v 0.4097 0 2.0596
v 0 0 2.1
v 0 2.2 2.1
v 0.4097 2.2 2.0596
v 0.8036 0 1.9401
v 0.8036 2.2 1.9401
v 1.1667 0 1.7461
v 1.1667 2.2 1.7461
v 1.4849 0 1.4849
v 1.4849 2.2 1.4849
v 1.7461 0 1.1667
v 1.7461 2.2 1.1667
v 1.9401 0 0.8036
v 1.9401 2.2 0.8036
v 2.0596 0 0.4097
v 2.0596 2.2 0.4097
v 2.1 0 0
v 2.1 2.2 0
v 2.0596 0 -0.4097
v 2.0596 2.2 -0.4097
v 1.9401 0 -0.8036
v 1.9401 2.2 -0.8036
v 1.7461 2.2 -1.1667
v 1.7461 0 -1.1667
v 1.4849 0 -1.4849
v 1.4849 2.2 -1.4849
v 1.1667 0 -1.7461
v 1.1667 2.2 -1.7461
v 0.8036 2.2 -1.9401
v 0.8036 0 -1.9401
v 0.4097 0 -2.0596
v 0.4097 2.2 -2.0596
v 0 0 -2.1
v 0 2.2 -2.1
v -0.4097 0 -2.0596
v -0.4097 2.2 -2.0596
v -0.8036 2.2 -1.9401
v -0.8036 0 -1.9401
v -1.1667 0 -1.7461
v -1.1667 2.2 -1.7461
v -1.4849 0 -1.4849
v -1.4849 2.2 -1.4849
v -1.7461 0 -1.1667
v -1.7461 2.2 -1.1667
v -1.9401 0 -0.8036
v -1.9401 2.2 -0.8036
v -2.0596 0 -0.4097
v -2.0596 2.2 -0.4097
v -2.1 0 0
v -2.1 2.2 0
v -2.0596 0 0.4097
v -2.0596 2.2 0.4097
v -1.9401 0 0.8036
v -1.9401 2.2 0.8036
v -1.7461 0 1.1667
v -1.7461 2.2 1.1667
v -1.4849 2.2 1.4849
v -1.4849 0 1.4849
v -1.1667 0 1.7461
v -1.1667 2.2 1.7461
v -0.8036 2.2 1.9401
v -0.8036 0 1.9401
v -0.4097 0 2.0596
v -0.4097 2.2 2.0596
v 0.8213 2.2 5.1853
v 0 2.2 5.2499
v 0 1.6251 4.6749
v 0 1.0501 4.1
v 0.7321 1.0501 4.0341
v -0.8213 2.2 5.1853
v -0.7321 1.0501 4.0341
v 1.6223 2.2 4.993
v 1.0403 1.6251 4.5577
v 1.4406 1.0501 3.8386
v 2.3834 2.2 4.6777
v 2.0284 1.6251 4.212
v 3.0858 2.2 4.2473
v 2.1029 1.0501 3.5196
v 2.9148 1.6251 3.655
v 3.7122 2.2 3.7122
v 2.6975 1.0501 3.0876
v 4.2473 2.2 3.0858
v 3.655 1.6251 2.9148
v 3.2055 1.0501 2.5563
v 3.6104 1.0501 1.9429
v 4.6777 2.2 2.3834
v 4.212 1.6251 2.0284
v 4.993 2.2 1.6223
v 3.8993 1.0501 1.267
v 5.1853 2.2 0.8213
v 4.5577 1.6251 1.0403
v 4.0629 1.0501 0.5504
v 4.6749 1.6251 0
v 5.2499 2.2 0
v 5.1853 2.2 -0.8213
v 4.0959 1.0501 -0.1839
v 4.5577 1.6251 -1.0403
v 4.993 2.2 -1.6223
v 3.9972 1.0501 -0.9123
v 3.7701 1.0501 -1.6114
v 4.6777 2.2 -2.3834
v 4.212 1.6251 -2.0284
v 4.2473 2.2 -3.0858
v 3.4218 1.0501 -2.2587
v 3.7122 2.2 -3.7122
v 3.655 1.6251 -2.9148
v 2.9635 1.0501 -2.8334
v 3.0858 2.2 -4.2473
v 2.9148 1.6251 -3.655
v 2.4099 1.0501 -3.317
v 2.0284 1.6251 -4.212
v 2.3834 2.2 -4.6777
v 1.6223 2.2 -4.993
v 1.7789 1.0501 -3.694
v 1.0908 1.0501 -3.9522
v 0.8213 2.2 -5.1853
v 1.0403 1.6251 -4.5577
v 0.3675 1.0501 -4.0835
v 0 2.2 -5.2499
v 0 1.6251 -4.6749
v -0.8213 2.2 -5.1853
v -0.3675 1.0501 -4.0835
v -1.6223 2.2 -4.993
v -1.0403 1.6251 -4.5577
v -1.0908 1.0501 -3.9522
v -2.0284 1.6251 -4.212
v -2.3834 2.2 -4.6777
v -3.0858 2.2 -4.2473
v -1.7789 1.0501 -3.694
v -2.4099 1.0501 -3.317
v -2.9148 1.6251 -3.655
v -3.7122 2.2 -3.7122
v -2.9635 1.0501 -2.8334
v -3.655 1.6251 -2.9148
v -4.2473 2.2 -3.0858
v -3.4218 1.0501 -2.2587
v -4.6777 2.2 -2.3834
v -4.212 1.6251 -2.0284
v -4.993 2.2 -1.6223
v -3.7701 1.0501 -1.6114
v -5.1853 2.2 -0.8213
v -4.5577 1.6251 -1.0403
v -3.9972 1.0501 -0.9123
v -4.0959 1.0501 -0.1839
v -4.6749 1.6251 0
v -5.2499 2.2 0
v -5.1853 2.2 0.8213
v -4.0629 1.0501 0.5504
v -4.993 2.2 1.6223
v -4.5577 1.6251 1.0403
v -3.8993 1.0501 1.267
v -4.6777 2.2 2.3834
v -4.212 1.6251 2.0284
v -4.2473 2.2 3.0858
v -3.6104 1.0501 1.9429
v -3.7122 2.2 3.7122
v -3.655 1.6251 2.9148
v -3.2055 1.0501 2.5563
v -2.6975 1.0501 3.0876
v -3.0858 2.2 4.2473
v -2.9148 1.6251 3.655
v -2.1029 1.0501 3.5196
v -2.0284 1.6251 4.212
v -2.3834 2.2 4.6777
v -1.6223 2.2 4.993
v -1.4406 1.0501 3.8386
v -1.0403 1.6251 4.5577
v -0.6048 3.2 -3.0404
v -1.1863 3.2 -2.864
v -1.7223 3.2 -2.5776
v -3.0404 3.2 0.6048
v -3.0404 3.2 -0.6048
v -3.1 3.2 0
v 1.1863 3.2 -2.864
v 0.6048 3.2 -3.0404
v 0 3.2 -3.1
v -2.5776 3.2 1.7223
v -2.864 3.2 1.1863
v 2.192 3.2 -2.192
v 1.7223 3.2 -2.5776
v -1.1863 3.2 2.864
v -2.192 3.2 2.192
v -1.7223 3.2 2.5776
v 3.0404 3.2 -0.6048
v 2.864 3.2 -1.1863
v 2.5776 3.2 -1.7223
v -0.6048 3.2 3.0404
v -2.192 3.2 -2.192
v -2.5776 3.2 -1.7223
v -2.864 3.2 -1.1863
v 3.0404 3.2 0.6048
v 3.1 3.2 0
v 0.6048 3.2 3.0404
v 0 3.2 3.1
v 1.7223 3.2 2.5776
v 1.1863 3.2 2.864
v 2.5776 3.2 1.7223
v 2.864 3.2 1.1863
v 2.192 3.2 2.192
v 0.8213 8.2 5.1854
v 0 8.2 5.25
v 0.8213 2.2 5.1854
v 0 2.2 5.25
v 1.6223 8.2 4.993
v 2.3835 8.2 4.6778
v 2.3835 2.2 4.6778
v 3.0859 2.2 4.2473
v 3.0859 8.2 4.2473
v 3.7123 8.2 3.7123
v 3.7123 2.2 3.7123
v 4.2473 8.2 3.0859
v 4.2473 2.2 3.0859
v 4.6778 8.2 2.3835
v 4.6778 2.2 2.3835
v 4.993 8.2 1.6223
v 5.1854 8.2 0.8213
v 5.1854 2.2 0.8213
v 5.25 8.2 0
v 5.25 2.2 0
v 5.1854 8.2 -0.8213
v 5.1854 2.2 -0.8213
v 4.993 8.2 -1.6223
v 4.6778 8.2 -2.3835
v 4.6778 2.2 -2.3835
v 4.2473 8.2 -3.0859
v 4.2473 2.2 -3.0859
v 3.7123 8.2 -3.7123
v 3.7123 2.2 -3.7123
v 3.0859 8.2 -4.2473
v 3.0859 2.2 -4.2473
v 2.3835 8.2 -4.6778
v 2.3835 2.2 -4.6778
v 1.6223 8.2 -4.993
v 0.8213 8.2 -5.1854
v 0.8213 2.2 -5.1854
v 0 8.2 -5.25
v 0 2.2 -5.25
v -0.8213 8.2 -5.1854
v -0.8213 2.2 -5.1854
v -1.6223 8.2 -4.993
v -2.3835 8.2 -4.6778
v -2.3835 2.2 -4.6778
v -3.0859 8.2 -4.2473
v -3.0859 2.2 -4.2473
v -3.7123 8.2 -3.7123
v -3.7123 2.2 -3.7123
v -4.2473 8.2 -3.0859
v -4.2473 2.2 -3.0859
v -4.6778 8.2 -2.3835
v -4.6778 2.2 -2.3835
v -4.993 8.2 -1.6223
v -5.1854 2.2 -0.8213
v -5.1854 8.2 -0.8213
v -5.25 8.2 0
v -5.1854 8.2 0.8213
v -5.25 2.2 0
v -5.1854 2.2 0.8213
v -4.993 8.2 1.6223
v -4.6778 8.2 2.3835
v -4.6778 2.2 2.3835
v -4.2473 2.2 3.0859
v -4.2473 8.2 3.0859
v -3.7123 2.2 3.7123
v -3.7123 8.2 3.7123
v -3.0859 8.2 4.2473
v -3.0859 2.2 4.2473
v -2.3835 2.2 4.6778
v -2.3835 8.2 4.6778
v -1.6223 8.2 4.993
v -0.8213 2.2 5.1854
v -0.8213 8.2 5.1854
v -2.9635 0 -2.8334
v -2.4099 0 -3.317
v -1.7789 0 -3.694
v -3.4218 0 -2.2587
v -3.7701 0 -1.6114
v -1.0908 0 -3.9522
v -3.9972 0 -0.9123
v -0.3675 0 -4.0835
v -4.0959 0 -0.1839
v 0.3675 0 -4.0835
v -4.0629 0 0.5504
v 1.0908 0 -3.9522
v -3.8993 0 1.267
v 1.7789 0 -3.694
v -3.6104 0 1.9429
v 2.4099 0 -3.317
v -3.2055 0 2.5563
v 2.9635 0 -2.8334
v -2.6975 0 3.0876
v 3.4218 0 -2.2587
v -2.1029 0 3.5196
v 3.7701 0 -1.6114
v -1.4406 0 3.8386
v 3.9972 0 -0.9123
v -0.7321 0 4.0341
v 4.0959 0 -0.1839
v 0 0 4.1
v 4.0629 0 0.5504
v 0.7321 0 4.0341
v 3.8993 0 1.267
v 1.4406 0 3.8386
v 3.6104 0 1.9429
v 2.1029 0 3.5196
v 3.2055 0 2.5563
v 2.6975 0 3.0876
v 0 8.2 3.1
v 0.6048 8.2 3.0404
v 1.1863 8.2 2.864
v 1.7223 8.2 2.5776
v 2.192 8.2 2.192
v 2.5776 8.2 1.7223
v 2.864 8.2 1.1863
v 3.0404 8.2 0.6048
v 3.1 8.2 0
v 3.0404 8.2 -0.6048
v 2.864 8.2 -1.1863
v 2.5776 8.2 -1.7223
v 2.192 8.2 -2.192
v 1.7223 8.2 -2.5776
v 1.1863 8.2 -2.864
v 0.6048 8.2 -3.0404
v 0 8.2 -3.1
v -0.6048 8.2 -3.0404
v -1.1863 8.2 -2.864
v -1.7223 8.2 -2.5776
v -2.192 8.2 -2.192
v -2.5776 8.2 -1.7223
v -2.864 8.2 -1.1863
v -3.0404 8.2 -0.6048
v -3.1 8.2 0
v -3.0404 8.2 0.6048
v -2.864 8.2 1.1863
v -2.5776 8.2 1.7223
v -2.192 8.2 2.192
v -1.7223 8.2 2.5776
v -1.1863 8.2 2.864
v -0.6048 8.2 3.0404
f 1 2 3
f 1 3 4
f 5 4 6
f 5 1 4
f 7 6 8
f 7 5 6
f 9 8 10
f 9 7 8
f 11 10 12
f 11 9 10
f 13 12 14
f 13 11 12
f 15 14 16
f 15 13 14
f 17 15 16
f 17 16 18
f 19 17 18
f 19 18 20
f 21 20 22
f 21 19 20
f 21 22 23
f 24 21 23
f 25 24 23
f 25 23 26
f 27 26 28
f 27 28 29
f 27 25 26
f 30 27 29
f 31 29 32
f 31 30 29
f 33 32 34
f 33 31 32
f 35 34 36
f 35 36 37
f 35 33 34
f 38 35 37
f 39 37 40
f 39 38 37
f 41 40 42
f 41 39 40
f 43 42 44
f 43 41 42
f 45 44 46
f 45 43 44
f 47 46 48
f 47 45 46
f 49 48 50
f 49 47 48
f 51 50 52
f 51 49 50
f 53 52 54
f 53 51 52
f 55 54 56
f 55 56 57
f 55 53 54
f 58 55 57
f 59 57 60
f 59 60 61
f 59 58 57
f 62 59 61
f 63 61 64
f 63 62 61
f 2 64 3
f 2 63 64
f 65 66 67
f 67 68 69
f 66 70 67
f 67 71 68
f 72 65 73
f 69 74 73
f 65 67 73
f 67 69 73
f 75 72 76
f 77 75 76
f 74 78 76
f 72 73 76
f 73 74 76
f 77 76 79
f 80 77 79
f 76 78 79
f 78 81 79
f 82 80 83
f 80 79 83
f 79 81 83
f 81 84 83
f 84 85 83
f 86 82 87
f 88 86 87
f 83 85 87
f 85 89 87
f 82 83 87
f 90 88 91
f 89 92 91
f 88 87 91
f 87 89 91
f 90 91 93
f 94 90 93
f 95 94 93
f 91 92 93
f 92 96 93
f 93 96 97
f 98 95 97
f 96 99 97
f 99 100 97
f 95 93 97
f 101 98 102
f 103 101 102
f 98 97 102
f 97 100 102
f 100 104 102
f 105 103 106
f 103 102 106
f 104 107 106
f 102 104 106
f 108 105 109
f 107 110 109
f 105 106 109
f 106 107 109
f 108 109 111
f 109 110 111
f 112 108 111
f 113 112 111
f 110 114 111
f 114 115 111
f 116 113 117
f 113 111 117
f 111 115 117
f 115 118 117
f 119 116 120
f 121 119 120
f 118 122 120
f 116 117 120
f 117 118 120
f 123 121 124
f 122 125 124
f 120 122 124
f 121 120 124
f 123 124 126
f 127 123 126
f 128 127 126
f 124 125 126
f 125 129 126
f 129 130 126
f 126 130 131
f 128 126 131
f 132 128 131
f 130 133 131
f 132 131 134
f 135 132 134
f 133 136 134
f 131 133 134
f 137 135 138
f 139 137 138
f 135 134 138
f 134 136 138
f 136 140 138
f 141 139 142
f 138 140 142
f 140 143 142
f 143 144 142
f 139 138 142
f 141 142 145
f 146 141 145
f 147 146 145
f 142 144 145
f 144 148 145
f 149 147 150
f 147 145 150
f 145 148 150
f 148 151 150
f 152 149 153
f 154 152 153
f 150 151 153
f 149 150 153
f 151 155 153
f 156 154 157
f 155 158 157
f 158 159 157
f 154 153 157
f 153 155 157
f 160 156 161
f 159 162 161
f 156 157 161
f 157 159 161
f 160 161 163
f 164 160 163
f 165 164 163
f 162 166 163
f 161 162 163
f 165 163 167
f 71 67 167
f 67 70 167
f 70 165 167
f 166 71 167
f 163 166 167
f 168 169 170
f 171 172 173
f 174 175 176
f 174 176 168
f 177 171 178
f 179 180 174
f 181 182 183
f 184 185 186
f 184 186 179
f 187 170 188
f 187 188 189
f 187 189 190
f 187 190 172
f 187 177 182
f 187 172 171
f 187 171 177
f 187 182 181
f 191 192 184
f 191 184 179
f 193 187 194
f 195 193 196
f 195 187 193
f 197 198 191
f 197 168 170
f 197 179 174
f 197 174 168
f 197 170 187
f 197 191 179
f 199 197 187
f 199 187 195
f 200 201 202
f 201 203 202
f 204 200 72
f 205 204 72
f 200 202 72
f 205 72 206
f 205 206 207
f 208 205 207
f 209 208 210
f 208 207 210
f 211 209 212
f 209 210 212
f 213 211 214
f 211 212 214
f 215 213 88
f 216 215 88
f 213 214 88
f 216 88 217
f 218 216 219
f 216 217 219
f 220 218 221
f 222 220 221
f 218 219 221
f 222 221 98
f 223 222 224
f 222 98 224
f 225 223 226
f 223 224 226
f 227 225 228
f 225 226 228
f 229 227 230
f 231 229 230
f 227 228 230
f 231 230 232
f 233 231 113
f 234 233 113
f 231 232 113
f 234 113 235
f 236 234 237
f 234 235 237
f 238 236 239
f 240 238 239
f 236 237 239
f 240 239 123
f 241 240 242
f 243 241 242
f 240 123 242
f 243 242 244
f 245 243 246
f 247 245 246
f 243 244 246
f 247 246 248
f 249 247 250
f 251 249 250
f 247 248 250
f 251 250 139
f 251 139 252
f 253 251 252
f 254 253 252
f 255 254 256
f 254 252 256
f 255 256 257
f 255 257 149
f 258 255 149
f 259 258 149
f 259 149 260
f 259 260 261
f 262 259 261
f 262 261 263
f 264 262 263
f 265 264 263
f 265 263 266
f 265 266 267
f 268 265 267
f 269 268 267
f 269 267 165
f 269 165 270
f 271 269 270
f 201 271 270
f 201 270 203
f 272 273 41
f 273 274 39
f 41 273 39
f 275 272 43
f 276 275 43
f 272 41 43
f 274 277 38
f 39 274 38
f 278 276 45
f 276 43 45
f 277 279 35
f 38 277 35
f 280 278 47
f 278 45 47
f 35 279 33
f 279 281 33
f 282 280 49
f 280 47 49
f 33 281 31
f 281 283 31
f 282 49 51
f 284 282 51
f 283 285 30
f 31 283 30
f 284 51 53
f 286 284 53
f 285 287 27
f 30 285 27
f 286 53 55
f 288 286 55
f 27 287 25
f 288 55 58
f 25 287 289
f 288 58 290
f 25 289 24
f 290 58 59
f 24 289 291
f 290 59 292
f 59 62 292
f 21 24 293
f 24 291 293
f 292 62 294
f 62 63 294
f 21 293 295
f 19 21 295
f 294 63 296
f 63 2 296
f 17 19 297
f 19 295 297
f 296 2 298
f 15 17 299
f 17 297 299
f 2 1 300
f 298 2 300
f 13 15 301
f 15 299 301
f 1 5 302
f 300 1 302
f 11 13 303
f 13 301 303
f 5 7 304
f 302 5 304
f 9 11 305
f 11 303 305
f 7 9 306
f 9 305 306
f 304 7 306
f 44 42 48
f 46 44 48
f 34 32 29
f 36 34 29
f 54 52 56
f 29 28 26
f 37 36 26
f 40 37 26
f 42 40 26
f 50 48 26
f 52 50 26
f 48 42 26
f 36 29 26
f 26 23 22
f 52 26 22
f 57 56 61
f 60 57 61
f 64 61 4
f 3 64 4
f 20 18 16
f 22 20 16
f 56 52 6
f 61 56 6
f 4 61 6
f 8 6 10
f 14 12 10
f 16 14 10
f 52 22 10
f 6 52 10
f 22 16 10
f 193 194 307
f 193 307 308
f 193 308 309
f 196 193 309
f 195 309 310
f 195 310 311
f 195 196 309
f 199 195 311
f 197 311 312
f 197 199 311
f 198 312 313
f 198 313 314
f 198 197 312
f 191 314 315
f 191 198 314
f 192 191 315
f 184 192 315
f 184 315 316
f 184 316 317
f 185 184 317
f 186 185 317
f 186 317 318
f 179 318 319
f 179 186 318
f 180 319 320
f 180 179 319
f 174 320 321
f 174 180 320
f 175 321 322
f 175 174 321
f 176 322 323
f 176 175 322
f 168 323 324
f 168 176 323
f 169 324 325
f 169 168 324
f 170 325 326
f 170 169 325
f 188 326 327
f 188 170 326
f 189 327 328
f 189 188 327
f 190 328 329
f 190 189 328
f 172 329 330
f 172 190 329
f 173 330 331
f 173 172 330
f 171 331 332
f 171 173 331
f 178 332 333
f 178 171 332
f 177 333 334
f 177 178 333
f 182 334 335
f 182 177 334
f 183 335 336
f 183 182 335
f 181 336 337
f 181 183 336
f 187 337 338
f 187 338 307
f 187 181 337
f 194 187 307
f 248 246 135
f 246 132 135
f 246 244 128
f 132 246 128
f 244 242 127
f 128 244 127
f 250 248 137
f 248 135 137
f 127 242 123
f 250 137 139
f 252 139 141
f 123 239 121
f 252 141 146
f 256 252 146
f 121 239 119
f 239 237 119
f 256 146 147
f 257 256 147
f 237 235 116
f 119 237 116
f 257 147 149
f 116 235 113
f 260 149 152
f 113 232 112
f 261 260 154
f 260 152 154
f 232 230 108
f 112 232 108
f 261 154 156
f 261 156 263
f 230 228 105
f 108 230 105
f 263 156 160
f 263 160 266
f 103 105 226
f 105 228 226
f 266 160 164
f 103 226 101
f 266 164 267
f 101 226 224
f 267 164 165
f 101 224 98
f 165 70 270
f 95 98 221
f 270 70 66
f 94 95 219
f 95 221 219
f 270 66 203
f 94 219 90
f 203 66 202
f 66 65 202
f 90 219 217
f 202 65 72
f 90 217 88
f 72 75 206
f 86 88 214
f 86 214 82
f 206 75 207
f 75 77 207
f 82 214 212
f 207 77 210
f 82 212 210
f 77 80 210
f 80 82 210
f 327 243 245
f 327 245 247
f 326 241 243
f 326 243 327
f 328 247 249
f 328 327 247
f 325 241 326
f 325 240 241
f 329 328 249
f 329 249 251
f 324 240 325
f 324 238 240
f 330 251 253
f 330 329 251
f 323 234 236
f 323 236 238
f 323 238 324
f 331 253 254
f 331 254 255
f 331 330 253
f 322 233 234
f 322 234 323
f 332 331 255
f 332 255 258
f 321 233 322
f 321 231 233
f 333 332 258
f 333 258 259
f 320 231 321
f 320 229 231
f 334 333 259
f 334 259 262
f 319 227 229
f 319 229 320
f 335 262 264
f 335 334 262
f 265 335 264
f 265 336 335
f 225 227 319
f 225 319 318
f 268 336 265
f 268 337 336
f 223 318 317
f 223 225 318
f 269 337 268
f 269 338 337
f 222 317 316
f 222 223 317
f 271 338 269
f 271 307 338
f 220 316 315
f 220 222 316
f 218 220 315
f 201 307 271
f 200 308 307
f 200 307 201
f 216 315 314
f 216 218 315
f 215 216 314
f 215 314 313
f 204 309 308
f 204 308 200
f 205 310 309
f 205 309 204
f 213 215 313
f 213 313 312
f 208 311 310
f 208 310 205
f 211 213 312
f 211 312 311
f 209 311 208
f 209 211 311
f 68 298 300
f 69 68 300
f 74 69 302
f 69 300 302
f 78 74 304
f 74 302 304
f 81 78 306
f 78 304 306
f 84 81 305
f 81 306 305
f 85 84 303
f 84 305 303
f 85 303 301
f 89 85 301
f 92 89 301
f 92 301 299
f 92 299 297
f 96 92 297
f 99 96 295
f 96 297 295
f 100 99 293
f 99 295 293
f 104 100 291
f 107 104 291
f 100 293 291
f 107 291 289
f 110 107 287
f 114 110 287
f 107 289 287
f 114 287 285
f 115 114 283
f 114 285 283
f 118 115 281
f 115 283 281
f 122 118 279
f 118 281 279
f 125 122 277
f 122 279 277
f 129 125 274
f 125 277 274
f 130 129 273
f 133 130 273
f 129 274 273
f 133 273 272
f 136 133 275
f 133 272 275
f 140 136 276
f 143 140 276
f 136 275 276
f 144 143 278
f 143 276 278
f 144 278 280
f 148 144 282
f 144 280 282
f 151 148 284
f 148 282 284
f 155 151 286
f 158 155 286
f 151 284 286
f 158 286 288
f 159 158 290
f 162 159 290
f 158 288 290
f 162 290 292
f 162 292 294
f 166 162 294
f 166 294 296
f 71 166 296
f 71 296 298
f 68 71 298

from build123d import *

# Parameters (mm, degrees)
SKETCH1_R           = 4.1
SKETCH1_R_2         = 2.1
BOSS_EXTRUDE1_DEPTH = 2.2
SKETCH2_R           = 5.25
BOSS_EXTRUDE2_DEPTH = 1
SKETCH3_R           = 5.25
SKETCH3_R_2         = 3.1
BOSS_EXTRUDE3_DEPTH = 5
CHAMFER1_SIZE       = 1.15


with BuildPart() as part:
    # Sketch1 → Boss-Extrude1 (new body)
    with BuildSketch(Plane(origin=(0, 0, 0), x_dir=(1, 0, 0), z_dir=(0, 1, 0))):
        with Locations(Location((0, 0, 0), (0, 0, 270))):
            Circle(SKETCH1_R)
        with Locations(Location((0, 0, 0), (0, 0, 270))):
            Circle(SKETCH1_R_2, mode=Mode.SUBTRACT)
    extrude(amount=BOSS_EXTRUDE1_DEPTH)

    # Sketch2 → Boss-Extrude2 (add)
    with BuildSketch(Plane(origin=(0, 2.2, 0), x_dir=(1, 0, 0), z_dir=(0, 1, 0))):
        with Locations(Location((0, 0, 0), (0, 0, 270))):
            Circle(SKETCH2_R)
    extrude(amount=BOSS_EXTRUDE2_DEPTH)

    # Sketch3 → Boss-Extrude3 (add)
    with BuildSketch(Plane(origin=(0, 3.2, 0), x_dir=(1, 0, 0), z_dir=(0, 1, 0))):
        with Locations(Location((0, 0, 0), (0, 0, 270))):
            Circle(SKETCH3_R)
        with Locations(Location((0, 0, 0), (0, 0, 270))):
            Circle(SKETCH3_R_2, mode=Mode.SUBTRACT)
    extrude(amount=BOSS_EXTRUDE3_DEPTH)

    # Chamfer1
    chamfer1_edges = [part.edges().sort_by_distance(p)[0] for p in [
        (0, 2.2, -4.1),
    ]]
    chamfer(chamfer1_edges, length=CHAMFER1_SIZE - 0.0001)  # a hair under: the kernel refuses the full size


solid = part.part
